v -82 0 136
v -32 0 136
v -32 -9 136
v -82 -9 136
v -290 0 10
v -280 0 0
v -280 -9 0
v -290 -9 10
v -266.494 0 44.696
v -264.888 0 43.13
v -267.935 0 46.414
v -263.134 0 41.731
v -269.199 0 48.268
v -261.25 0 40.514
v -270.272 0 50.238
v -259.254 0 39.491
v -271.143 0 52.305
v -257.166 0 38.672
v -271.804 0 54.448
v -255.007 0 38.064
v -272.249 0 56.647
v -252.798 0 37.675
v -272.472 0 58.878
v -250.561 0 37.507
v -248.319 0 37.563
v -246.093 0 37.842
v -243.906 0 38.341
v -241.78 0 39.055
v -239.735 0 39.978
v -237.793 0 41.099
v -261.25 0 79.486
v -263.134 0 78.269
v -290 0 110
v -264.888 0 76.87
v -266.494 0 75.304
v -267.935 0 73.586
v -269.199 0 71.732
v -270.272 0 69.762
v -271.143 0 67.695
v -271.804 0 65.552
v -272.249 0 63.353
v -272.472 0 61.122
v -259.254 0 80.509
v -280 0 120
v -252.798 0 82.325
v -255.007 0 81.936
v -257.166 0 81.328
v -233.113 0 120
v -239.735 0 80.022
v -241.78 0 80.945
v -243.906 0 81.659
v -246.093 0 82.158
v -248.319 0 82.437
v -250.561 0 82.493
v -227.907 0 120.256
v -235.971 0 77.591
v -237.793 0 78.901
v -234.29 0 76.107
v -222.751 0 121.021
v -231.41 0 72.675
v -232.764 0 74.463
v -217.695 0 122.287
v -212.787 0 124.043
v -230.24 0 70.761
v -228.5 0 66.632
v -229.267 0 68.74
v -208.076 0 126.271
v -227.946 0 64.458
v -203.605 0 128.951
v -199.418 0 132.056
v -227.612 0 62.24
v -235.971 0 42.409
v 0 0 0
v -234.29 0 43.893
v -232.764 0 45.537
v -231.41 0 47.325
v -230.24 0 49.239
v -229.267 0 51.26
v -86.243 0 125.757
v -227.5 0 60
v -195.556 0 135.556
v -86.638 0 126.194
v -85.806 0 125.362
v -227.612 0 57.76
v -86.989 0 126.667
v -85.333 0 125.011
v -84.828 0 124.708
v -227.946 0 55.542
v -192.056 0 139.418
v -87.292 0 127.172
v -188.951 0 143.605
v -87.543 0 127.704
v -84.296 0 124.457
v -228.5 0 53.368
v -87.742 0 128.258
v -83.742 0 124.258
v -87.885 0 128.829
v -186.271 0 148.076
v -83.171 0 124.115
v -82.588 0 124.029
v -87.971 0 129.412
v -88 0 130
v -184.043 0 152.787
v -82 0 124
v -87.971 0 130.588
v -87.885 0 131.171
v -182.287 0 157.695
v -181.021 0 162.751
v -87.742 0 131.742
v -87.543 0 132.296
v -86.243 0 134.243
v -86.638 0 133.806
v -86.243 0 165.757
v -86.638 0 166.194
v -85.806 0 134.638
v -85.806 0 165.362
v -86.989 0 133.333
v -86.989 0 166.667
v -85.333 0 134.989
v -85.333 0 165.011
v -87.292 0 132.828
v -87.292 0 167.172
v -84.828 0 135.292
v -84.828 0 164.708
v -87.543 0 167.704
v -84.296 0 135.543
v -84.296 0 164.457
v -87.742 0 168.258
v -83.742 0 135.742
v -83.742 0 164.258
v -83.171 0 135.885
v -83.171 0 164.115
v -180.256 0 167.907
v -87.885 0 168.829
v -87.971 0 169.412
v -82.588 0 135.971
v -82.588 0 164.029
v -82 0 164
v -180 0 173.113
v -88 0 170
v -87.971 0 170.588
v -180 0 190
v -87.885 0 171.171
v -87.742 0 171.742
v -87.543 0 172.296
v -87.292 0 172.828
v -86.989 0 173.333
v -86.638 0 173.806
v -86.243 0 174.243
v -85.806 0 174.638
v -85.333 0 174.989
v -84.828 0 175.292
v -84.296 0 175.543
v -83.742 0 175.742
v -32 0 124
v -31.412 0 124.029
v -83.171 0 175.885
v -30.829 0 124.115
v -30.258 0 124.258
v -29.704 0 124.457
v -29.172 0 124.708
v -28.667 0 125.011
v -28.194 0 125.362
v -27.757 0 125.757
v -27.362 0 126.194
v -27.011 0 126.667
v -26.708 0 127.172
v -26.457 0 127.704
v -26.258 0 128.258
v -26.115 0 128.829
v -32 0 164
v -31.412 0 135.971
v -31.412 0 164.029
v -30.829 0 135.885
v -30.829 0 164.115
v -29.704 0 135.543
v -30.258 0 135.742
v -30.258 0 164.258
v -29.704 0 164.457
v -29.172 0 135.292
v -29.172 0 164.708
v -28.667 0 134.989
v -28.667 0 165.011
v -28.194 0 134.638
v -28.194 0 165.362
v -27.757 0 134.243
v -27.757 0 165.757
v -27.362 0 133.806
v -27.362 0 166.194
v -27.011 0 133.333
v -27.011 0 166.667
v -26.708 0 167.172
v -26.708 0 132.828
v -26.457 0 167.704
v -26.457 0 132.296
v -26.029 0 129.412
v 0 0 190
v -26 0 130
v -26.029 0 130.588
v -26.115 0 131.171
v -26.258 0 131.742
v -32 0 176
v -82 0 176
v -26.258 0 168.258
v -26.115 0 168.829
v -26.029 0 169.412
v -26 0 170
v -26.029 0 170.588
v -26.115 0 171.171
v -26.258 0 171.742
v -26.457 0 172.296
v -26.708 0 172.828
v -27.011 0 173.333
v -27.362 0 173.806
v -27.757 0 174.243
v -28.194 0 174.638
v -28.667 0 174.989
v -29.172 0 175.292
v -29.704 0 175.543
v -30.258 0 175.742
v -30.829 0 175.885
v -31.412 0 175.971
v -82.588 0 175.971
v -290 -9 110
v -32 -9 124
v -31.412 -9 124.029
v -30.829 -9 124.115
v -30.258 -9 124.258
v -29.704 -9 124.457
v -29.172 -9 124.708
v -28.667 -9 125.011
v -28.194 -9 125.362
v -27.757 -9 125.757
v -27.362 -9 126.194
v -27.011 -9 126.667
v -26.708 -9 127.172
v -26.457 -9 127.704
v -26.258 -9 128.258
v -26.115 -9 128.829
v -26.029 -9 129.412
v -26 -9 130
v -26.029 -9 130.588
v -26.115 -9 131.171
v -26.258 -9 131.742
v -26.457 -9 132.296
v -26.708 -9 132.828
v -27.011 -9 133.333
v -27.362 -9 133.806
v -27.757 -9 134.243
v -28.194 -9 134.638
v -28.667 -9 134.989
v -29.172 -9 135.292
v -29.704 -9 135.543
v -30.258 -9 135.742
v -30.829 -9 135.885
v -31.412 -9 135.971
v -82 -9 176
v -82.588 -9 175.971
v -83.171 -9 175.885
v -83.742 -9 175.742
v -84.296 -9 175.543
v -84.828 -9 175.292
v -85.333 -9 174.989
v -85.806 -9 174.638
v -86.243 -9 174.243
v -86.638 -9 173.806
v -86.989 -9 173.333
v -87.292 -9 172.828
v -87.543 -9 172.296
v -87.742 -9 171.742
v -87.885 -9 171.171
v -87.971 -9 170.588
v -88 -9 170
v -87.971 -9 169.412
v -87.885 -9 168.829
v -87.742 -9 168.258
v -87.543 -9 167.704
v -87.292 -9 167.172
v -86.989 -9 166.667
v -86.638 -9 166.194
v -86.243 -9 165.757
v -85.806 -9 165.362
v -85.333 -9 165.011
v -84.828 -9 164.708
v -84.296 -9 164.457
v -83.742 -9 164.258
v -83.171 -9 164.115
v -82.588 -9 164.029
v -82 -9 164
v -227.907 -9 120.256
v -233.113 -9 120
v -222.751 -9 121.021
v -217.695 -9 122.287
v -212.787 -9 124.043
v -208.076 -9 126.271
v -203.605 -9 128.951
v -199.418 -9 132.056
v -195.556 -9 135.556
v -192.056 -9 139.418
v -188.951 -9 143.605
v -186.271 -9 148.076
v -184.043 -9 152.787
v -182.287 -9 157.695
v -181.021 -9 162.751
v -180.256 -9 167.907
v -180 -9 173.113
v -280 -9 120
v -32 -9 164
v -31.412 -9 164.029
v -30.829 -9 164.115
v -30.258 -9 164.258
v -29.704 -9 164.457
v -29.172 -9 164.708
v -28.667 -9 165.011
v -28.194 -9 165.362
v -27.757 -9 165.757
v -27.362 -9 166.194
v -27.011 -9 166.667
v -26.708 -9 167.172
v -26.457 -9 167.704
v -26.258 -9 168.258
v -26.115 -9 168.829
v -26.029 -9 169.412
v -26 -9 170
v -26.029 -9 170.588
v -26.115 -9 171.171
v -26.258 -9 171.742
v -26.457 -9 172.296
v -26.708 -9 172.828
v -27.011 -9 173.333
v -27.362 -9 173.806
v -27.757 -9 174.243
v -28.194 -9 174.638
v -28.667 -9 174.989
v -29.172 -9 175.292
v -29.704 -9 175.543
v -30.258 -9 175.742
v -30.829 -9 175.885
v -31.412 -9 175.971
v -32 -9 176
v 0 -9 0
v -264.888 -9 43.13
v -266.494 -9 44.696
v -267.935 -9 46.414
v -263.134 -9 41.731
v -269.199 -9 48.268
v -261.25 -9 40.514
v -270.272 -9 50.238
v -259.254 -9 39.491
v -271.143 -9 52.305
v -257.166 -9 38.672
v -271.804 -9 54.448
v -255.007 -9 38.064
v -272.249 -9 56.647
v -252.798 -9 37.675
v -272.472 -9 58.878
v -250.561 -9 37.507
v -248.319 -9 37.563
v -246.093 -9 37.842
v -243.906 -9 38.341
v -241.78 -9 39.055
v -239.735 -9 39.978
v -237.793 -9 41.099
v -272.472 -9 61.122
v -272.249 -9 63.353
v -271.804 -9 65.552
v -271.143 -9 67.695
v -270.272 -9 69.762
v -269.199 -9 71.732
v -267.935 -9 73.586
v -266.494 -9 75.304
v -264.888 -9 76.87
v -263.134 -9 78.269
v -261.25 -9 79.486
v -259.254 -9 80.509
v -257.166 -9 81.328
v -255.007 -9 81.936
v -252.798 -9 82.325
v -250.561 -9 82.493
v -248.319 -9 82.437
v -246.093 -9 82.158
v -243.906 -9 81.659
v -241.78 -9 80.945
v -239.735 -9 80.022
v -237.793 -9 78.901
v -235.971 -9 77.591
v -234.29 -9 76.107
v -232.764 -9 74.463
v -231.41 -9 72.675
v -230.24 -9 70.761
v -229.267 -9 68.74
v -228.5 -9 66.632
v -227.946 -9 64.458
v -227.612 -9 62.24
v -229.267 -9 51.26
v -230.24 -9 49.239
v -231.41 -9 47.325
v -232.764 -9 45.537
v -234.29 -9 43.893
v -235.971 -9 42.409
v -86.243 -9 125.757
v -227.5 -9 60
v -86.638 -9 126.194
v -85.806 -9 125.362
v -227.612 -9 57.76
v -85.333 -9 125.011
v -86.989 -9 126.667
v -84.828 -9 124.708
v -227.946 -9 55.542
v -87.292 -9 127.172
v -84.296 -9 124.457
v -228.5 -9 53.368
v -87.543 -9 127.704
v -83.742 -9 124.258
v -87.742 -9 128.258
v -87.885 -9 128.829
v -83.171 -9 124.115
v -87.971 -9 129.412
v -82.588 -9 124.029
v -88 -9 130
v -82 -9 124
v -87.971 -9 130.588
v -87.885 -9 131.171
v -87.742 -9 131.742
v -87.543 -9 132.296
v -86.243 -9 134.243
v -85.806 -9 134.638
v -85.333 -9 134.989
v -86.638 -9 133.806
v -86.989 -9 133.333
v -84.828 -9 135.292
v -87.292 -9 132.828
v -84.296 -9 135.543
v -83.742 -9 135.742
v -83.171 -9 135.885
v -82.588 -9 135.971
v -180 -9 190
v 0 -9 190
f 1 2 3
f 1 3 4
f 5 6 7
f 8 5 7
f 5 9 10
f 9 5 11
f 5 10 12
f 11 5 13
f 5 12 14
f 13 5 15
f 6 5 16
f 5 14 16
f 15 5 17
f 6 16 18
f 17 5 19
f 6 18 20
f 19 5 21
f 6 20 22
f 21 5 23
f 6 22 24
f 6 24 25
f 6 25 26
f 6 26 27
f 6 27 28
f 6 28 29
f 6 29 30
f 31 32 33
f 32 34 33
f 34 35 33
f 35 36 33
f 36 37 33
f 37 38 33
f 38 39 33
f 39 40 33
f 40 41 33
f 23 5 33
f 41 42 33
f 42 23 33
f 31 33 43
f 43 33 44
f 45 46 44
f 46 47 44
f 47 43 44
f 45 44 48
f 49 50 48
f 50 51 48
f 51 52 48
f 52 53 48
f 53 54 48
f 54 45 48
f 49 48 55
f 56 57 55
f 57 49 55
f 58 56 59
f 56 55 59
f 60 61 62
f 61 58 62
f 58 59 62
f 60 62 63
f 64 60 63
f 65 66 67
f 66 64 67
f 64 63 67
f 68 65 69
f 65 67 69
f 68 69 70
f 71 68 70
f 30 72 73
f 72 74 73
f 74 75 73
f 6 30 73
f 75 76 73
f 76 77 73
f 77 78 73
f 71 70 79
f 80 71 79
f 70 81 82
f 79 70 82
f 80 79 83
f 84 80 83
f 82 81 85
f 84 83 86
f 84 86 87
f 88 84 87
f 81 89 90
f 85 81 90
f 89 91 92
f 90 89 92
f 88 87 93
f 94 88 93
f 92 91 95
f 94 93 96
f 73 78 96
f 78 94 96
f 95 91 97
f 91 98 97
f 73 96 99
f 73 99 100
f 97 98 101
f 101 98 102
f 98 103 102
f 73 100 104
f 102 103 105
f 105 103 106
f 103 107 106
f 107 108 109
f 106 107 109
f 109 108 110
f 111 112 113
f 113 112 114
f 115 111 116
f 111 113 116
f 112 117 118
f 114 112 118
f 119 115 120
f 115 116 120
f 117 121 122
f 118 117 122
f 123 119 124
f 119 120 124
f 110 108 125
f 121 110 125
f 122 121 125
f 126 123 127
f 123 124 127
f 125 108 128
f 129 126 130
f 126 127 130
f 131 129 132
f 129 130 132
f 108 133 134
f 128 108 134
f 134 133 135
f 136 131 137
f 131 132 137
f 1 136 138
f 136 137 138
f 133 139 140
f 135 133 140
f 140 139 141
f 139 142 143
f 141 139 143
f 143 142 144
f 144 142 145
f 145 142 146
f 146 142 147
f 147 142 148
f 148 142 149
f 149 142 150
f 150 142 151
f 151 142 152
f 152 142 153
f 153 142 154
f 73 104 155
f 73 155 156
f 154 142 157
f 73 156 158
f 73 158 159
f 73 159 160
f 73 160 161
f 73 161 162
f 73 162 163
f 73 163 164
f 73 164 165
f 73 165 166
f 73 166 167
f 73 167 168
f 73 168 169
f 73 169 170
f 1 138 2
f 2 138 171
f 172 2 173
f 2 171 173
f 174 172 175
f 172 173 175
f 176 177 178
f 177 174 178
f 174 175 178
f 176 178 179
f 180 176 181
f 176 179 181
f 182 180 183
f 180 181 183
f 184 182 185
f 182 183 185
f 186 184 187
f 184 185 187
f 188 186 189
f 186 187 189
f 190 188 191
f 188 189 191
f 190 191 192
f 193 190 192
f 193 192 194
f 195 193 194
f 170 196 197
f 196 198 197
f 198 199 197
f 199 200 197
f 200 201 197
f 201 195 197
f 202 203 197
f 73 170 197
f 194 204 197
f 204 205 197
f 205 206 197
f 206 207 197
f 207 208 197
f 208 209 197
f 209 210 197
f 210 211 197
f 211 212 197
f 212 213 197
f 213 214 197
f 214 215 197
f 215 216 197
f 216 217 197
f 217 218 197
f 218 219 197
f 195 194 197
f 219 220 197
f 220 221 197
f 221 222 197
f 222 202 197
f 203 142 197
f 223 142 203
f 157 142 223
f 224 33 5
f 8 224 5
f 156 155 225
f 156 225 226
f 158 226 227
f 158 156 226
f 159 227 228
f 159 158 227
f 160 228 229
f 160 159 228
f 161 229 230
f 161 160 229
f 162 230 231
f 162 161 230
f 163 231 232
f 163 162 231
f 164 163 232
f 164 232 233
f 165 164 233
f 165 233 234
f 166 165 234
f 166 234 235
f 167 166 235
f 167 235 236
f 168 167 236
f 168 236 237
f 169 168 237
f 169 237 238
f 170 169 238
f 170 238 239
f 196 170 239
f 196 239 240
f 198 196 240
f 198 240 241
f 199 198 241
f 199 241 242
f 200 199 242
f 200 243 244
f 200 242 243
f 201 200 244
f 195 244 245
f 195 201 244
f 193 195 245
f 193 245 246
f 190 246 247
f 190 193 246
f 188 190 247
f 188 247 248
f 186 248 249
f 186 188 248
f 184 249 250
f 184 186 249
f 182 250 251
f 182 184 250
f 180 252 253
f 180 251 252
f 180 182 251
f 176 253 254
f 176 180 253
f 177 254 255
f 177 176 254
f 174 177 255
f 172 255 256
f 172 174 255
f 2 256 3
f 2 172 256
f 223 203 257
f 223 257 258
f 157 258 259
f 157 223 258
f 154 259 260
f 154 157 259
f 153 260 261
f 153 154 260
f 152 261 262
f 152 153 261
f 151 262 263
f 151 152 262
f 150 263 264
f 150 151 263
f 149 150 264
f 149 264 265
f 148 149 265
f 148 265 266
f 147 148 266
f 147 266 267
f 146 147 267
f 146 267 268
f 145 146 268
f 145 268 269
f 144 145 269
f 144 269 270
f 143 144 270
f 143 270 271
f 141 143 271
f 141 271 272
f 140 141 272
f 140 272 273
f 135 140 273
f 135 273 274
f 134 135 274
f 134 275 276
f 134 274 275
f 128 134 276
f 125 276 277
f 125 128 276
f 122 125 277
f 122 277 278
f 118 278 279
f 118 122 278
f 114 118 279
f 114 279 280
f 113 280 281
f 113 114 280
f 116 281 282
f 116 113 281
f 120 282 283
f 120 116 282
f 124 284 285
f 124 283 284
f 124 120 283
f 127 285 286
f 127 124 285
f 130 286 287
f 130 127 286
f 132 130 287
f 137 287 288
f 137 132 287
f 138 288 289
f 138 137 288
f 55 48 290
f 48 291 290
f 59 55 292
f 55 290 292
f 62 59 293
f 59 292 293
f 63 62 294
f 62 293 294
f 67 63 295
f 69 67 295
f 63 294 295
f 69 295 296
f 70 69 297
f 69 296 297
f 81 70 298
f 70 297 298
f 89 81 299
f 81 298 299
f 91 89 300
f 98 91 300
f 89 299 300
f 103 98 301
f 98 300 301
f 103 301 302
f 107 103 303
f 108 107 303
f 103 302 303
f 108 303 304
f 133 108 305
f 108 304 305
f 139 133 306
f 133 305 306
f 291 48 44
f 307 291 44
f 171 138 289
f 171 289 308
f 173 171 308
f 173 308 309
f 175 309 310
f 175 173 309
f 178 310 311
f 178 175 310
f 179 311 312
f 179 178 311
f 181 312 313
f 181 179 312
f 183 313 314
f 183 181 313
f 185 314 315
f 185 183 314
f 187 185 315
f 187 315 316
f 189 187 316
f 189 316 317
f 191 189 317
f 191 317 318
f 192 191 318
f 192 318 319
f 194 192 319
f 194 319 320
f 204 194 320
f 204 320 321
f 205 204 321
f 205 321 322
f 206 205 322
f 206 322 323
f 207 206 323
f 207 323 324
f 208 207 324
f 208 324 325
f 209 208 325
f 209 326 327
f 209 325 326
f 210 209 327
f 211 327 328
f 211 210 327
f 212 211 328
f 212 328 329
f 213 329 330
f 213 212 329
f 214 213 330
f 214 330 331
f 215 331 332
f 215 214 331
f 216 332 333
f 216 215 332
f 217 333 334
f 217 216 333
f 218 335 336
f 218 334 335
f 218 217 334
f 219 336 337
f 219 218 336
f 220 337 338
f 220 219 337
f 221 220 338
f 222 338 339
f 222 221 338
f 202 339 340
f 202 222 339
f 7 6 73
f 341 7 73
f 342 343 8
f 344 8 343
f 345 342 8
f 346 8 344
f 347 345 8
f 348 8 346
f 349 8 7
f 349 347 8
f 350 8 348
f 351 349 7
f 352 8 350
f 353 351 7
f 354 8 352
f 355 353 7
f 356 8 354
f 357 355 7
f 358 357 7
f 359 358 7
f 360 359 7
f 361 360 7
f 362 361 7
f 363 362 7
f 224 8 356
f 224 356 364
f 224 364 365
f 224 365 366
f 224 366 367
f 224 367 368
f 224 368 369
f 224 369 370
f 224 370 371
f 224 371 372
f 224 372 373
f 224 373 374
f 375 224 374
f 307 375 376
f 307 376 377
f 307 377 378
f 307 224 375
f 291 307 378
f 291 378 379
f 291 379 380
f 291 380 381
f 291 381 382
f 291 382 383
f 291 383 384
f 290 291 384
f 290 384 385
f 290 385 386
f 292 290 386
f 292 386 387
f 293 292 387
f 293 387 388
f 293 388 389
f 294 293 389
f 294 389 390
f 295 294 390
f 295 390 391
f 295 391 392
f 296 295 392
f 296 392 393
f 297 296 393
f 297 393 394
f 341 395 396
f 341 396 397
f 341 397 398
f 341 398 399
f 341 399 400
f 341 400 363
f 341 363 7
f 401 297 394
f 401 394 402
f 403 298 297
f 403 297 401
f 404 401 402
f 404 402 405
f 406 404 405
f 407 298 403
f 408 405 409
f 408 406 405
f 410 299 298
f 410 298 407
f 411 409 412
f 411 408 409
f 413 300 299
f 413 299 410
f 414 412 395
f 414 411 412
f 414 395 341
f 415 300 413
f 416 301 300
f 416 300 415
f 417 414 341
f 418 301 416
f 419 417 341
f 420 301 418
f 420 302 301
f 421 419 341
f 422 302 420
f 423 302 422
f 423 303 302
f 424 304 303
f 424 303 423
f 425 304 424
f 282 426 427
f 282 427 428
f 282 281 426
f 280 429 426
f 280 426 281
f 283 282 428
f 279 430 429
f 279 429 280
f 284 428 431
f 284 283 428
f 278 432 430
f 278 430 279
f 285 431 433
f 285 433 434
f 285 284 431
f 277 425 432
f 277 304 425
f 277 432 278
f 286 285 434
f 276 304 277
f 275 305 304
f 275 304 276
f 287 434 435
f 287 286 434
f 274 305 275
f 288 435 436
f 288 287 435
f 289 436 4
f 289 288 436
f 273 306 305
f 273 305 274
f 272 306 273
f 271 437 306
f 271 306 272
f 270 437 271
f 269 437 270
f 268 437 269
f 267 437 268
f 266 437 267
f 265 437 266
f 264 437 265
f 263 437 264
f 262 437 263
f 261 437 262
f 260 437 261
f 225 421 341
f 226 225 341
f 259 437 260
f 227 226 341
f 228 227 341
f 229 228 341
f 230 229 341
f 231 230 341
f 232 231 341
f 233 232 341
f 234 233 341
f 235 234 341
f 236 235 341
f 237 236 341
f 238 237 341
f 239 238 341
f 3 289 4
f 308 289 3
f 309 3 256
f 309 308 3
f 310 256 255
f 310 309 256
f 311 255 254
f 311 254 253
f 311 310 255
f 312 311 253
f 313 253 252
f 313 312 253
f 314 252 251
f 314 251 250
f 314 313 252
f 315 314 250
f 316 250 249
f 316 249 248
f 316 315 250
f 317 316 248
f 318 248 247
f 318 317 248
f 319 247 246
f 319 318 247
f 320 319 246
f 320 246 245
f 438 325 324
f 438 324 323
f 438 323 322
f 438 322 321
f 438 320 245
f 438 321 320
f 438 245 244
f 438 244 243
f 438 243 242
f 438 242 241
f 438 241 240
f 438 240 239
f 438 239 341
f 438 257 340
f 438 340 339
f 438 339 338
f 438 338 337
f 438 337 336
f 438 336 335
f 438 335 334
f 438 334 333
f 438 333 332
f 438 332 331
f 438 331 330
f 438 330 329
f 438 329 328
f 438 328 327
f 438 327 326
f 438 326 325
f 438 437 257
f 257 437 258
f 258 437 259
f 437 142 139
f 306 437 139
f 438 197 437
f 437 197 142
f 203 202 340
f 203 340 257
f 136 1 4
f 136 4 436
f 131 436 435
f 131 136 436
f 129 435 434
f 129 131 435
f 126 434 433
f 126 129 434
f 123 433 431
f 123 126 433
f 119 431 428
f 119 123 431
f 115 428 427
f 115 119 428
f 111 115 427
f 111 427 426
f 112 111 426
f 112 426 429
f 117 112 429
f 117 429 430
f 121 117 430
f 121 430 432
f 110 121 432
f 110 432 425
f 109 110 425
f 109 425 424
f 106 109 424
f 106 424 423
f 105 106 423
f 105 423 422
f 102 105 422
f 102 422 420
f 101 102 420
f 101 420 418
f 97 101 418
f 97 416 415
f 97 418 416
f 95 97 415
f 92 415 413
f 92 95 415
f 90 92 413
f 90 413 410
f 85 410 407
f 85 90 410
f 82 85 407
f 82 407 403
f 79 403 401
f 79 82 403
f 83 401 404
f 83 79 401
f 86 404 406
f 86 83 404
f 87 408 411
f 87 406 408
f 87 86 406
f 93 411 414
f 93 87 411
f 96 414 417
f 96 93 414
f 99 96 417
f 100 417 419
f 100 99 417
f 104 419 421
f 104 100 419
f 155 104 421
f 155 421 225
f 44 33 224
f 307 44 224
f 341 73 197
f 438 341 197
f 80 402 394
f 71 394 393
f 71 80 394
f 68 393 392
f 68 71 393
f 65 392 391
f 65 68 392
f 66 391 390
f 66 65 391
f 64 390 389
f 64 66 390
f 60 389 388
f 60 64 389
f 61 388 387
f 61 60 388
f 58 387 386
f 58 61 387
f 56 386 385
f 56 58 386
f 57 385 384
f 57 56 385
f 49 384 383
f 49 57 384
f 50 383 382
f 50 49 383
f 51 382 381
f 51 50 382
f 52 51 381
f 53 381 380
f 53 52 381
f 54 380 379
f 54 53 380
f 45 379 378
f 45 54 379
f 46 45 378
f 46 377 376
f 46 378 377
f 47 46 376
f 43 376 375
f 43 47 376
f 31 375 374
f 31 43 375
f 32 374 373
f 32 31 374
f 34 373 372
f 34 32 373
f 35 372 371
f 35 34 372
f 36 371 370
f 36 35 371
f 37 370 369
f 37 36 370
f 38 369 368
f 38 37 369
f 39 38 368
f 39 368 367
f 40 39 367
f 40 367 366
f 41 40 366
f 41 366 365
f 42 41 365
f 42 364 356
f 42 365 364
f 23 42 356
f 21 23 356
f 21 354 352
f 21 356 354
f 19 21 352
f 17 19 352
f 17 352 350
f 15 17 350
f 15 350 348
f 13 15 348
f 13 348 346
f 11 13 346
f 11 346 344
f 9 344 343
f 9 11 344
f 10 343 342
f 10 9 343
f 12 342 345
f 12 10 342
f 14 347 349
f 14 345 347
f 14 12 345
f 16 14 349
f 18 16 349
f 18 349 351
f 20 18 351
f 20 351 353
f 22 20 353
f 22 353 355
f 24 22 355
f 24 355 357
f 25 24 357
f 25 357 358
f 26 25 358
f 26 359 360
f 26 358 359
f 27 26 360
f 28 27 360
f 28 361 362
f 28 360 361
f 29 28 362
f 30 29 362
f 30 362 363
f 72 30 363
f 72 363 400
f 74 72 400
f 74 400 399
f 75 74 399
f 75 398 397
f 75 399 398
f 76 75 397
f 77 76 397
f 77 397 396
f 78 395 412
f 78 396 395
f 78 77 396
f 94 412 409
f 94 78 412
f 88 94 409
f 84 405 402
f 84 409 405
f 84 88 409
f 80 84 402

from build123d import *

# Parameters (mm, degrees)
F1_DEPTH = 9
F2_R     = 22.5
F3_DEPTH = 9.001
F4_R     = 53.1126983722
F5_SIZE  = 10


with BuildPart() as f1:
    # F0 (on Front) → F1 (new body)
    with BuildSketch(Plane.XZ):
        Polygon((-290, 0), (0, 0), (0, 190), (-180, 190), (-180, 120), (-290, 120), align=None)
    extrude(amount=F1_DEPTH)

    # F2 (on Front) → F3 (cut, through all)
    with BuildSketch(Plane.XZ):
        with BuildLine():
            Line((-32, 176), (-82, 176))
            ThreePointArc((-82, 176), (-88, 170), (-82, 164))
            Line((-82, 164), (-32, 164))
            ThreePointArc((-32, 164), (-26, 170), (-32, 176))
        make_face()
        with BuildLine():
            Line((-32, 136), (-82, 136))
            ThreePointArc((-82, 136), (-88, 130), (-82, 124))
            Line((-82, 124), (-32, 124))
            ThreePointArc((-32, 124), (-26, 130), (-32, 136))
        make_face()
        with Locations((-250, 60)):
            Circle(F2_R)
    extrude(amount=F3_DEPTH, mode=Mode.SUBTRACT)

    # F4
    f4_edges = [f1.edges().sort_by_distance(p)[0] for p in [
        (-180, -4.5, 120),
    ]]
    fillet(f4_edges, radius=F4_R)

    # F5
    f5_edges = [f1.edges().sort_by_distance(p)[0] for p in [
        (-290, -4.5, 0),
        (-290, -4.5, 120),
    ]]
    chamfer(f5_edges, length=F5_SIZE)


solid = f1.part
